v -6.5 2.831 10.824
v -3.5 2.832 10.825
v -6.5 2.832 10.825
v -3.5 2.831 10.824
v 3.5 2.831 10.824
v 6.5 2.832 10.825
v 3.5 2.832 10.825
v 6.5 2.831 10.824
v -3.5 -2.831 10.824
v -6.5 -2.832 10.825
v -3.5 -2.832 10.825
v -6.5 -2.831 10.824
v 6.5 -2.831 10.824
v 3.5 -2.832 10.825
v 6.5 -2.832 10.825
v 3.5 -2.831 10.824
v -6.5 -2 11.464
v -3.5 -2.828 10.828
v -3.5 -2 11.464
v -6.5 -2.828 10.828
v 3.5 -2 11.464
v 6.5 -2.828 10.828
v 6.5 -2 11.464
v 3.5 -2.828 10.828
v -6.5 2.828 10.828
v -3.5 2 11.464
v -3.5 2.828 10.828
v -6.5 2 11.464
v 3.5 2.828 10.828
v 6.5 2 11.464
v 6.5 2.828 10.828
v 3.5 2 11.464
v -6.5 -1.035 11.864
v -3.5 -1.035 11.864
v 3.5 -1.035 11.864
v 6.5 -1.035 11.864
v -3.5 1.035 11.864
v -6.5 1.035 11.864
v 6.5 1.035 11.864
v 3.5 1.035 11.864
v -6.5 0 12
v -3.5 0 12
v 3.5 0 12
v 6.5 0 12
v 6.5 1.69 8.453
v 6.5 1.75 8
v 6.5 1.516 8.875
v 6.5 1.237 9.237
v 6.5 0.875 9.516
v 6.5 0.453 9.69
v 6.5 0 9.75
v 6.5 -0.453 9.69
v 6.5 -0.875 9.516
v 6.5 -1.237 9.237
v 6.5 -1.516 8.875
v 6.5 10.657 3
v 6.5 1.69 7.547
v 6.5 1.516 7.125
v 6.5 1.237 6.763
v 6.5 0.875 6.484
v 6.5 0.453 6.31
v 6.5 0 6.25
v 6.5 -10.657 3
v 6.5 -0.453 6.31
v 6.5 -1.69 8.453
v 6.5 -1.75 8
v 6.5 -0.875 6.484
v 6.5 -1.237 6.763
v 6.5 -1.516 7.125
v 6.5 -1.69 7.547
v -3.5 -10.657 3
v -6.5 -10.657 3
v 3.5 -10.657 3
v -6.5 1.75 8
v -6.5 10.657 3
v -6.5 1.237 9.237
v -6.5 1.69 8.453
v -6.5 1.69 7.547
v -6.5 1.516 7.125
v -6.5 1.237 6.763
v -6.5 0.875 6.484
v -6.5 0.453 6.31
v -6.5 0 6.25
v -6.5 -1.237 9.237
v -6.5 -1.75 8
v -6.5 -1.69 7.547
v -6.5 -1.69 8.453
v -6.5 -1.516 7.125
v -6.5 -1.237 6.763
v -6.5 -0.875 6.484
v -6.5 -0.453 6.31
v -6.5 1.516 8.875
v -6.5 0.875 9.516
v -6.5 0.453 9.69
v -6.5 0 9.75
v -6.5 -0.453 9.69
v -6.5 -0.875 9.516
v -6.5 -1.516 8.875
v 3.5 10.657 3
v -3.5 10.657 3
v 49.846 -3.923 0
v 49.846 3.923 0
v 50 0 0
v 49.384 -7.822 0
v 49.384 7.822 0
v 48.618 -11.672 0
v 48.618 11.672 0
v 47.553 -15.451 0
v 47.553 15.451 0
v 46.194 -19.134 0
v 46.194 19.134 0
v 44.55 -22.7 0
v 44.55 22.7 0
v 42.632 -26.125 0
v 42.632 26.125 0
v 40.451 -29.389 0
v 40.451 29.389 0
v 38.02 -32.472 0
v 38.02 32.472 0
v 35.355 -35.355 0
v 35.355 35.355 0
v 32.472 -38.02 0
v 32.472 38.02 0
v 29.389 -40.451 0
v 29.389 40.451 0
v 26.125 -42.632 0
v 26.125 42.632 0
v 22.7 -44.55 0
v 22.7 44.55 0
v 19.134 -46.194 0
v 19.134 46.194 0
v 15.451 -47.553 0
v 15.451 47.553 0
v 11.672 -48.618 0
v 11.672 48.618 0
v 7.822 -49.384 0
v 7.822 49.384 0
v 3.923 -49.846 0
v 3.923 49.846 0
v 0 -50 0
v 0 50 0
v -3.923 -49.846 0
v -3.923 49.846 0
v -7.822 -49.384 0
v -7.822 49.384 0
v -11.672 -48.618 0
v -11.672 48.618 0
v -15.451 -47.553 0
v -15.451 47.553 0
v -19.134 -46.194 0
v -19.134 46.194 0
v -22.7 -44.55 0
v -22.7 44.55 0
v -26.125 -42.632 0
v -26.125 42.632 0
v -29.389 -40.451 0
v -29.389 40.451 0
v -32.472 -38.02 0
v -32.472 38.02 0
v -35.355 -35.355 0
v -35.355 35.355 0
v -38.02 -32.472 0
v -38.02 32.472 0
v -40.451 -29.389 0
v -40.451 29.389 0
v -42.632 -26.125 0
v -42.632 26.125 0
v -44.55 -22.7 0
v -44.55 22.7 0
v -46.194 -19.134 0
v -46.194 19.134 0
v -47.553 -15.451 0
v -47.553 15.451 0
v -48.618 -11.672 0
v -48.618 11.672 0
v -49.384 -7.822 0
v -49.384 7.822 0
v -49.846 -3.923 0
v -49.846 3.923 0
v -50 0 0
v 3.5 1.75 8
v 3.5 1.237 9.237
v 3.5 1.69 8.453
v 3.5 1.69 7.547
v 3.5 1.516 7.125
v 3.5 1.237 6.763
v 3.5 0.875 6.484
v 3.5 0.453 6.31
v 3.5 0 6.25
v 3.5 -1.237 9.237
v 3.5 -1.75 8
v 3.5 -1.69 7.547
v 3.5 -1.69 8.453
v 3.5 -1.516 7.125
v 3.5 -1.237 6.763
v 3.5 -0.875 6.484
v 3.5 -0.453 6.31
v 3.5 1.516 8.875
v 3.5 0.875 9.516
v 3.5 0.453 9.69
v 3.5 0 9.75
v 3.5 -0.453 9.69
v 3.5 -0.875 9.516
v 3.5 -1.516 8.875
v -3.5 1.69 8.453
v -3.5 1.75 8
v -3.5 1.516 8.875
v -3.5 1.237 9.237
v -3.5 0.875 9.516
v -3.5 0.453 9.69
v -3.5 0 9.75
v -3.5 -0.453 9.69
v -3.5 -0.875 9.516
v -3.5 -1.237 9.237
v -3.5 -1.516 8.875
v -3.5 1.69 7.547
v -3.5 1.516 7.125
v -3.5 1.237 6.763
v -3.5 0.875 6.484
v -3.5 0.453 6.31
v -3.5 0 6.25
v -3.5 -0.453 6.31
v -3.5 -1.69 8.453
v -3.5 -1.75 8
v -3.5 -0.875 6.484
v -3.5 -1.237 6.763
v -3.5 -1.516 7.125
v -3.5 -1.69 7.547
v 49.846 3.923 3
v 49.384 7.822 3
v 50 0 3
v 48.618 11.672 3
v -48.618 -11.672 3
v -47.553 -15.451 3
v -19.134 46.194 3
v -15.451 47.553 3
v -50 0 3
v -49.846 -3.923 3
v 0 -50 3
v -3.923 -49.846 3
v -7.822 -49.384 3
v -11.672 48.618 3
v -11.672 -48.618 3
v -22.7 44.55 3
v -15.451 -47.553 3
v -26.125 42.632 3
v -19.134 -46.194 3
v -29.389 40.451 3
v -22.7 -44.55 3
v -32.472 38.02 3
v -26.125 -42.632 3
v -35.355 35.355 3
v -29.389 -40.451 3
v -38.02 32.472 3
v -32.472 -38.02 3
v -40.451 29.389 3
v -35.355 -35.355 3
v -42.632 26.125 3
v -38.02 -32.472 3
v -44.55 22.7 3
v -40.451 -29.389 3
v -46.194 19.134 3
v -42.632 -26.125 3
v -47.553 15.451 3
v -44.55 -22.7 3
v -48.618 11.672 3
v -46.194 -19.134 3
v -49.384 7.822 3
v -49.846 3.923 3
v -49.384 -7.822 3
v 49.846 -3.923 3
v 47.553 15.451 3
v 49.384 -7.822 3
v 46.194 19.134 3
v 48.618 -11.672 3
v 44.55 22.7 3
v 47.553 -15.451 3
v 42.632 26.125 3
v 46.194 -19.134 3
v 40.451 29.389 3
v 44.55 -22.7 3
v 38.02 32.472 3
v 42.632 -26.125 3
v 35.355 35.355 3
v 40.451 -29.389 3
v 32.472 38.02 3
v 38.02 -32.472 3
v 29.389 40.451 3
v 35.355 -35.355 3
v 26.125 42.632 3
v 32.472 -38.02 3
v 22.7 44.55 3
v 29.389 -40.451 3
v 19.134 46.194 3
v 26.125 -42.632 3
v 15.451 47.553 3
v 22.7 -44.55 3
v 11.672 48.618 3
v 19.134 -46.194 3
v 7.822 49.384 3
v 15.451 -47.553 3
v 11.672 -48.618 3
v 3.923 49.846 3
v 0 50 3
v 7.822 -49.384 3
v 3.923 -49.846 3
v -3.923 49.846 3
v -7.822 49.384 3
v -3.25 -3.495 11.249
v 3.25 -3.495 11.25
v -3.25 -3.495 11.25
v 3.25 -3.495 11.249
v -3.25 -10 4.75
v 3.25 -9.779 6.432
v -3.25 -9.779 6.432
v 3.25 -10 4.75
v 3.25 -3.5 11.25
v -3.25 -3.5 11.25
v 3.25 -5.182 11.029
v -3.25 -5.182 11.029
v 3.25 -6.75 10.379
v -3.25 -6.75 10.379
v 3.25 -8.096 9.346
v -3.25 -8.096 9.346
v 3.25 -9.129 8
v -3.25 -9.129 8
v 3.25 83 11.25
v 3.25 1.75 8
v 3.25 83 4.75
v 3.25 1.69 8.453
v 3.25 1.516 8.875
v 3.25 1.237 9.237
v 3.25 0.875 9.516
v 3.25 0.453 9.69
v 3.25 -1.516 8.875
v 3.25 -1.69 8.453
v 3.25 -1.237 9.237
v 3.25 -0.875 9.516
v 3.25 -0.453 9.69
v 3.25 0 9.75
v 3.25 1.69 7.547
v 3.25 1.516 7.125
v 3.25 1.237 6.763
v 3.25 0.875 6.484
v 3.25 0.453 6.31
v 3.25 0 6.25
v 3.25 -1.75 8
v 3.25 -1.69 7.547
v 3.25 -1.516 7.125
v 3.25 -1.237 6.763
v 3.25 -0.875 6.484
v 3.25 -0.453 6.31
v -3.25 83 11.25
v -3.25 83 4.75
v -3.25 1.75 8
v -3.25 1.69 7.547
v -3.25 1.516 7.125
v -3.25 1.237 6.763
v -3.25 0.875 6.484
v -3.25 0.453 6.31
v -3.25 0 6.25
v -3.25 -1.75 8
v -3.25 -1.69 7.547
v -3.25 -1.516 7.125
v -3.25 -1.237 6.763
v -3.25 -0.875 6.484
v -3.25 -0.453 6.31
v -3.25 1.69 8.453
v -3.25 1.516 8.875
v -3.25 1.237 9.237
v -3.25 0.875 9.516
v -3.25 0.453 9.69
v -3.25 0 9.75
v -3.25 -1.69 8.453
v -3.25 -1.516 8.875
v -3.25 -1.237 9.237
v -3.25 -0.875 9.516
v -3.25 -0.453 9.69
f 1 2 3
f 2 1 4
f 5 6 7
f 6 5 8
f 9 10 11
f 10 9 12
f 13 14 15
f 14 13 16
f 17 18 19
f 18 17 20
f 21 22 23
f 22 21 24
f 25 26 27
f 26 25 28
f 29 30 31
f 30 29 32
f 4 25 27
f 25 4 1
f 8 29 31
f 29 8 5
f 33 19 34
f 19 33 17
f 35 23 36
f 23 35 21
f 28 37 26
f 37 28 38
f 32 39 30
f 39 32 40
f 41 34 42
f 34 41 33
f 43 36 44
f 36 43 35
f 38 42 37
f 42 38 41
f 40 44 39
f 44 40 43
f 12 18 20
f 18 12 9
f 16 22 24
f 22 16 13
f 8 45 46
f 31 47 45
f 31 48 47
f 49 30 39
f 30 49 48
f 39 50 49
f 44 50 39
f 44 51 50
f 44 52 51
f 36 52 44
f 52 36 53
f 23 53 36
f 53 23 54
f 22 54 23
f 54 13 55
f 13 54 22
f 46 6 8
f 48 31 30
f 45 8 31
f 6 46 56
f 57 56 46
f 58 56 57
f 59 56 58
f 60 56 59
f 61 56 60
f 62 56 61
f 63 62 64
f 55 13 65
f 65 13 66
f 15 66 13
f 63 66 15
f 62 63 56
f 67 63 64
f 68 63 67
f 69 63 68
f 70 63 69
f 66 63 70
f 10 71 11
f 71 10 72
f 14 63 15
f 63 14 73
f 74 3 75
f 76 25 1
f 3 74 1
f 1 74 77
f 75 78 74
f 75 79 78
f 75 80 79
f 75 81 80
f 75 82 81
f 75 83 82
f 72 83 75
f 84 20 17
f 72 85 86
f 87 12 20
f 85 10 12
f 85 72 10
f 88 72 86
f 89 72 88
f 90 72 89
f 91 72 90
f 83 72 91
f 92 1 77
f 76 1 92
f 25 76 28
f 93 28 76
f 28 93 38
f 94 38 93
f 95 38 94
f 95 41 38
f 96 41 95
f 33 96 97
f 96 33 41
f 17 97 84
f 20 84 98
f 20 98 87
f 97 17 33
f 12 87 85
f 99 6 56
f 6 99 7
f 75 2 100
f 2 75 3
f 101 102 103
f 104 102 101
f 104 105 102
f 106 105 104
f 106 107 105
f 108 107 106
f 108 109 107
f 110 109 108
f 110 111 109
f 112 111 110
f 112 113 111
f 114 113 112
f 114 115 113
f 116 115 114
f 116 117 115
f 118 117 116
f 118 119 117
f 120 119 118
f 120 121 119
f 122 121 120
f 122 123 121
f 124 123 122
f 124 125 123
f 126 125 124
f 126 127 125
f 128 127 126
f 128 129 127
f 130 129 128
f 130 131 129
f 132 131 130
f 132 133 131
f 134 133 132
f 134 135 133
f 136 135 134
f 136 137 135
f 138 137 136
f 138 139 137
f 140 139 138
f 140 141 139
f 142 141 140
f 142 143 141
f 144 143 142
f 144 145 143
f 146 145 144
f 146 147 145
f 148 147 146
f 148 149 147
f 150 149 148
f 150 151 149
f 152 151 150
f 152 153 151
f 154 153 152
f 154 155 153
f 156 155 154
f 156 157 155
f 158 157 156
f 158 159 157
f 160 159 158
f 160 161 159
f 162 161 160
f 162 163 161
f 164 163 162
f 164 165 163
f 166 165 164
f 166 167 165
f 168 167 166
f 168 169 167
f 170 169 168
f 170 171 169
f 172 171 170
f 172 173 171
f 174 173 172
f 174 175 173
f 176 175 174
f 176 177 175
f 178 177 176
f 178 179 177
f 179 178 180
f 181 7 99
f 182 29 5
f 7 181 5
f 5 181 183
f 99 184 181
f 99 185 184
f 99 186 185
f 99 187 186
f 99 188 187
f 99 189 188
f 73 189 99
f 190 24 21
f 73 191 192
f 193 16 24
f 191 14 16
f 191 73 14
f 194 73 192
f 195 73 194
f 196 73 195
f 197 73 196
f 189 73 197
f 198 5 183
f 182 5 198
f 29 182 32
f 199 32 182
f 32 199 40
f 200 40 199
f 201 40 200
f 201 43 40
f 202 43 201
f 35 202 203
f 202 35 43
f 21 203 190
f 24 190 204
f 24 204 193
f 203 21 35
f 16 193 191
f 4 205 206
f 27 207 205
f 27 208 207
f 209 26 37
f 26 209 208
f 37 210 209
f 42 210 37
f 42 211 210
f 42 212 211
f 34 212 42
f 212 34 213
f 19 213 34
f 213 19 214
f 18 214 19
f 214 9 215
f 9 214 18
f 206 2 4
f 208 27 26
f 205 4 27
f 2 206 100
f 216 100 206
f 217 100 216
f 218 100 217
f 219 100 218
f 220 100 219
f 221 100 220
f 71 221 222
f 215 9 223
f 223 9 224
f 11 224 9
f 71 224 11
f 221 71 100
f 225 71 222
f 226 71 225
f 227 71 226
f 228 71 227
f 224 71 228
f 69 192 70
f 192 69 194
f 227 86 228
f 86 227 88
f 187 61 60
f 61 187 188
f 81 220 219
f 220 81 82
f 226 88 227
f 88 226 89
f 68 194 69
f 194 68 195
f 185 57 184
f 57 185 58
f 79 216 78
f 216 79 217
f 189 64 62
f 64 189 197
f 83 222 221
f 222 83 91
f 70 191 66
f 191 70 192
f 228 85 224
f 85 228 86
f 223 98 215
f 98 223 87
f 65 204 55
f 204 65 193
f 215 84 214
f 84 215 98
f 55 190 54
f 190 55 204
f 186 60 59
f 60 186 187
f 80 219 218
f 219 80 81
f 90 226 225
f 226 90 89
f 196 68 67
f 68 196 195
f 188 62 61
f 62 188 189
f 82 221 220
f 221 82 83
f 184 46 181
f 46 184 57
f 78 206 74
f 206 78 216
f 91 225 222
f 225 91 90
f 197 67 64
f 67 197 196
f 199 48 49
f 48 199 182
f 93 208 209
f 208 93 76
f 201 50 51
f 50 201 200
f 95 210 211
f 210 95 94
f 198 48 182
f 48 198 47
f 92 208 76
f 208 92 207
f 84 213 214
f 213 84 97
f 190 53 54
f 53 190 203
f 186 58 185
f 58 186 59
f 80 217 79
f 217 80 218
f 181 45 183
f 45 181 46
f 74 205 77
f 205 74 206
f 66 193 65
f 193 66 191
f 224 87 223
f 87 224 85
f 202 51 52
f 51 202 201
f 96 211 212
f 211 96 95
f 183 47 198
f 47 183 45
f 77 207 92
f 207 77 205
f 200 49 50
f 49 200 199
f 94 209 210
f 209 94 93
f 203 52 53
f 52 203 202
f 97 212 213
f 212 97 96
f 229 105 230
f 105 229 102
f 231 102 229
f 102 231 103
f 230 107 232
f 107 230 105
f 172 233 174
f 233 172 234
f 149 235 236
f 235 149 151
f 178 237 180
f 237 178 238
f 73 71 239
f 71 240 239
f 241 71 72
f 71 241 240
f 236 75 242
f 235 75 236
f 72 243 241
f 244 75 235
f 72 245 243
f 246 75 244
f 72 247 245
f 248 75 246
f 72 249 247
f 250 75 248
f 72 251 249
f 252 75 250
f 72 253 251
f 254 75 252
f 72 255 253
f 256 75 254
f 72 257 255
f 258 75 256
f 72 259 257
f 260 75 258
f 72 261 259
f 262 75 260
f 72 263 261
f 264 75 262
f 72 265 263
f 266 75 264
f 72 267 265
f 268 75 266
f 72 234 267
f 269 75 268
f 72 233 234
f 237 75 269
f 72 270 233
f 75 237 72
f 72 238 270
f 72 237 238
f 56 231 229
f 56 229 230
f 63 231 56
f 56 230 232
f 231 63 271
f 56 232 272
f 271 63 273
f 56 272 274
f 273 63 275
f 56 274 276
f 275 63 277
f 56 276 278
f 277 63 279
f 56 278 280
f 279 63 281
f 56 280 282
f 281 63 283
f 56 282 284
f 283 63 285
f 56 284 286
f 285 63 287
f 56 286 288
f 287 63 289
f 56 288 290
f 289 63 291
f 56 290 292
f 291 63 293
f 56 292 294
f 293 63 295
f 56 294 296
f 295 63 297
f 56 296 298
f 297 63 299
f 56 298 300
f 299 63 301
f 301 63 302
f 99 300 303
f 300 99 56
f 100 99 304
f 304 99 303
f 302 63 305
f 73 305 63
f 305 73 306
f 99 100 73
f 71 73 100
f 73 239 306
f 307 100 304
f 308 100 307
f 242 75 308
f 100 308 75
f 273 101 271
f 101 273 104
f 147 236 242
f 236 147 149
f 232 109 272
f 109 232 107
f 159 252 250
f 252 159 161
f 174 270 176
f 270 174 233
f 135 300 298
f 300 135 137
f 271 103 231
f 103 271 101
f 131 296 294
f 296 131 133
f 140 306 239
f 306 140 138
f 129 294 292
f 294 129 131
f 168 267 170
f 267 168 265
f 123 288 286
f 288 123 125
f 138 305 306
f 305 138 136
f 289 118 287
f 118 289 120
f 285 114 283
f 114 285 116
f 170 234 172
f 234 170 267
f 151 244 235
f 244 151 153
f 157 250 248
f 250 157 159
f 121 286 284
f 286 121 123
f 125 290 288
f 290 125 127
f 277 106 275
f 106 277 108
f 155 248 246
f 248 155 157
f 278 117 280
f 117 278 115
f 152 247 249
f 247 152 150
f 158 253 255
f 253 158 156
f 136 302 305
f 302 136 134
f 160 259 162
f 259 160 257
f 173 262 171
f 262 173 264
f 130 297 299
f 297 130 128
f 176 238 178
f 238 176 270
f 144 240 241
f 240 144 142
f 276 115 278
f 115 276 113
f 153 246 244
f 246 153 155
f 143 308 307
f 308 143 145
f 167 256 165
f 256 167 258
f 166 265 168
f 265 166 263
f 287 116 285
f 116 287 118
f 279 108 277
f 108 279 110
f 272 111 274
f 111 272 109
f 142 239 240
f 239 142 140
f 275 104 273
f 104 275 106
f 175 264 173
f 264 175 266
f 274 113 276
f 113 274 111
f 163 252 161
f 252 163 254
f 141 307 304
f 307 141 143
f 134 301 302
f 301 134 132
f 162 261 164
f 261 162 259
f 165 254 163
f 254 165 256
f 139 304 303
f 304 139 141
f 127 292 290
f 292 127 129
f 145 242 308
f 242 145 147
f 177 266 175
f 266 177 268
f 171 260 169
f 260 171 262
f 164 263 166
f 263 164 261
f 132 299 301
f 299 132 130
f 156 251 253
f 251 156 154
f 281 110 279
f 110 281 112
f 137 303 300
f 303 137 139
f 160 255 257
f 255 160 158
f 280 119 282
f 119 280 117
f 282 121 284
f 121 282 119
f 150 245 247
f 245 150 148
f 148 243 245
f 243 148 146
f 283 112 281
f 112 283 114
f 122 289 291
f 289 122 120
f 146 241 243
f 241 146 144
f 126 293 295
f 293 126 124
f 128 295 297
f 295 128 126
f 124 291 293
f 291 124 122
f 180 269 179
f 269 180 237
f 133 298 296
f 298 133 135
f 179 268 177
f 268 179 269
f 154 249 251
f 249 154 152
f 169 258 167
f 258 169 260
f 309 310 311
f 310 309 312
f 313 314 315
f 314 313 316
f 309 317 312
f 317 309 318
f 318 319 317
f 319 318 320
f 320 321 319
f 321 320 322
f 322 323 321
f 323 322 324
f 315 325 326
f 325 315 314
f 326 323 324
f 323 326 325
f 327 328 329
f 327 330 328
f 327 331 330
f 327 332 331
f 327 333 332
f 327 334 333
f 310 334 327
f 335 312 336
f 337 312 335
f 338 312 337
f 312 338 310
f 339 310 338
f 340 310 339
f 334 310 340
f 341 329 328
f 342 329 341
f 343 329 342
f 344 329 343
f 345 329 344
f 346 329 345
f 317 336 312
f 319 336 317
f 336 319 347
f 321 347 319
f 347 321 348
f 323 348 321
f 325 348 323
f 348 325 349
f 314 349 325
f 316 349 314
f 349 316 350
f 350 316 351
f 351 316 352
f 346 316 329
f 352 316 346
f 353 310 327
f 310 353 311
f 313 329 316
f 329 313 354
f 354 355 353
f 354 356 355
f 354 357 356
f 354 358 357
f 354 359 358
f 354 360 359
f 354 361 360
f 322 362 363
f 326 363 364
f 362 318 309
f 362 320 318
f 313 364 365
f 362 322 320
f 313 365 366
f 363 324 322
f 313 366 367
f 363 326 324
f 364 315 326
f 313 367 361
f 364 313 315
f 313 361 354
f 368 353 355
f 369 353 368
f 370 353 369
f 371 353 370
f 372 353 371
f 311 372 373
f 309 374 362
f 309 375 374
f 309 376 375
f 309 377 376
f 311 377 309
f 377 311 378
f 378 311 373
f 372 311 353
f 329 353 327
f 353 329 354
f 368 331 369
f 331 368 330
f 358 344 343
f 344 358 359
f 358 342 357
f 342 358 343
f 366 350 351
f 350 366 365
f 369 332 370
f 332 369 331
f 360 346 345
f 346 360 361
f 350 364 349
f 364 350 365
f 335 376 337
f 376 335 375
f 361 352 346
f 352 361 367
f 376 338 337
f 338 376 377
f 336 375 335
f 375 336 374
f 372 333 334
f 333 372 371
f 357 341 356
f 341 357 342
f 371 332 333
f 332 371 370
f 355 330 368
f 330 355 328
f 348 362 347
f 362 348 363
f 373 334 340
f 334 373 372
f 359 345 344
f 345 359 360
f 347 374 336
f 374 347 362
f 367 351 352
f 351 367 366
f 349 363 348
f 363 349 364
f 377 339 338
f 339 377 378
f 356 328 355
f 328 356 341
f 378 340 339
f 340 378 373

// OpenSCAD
diameter = 100;
thickness = 3;
holeDiam = 3.5;
holeHeight = 5;

cornerRadius = 4;
rodWidth = 6.5;
rodLength = 93;
rodHolePos = 10;

$fn = 24;

module fillet(r, h) {
    translate([r / 2, r / 2, 0])
    difference() {
        cube([r + 0.01, r + 0.01, h], center = true);
        translate([r/2, r/2, 0]) cylinder(r = r, h = h + 1, center = true);
    }
}

module roundCornerCube(size, r) {
    difference() {
        cube(size, center=true);
        translate([0, size[1]/2, size[2]/2]) rotate([0, 90, 180])
            fillet(cornerRadius, size[0]+0.01);
    }
}

module cap() {
    cubeSide = 2*cornerRadius + sqrt(2)*holeHeight;
    sep = 2*thickness + rodWidth + 0.5;

    union() {
        cylinder(thickness, d=diameter, $fn=80);
        difference() {
            intersection() {
                translate([0, 0, thickness]) rotate([45, 0, 0])
                    roundCornerCube([sep, cubeSide, cubeSide], cornerRadius);
                cylinder(cubeSide, d=diameter);
            }
            cube([rodWidth + 0.5, 2*cubeSide, 2*cubeSide], center=true);
            translate([0, 0, thickness+holeHeight])
                rotate([0, 90, 0]) cylinder(sep, d=holeDiam, center=true);
        }
    }
}

module rod() {
    difference() {
        cube([rodWidth, rodLength, rodWidth], center=true);
        translate([0, -rodLength/2 + rodHolePos, 0]) rotate([0, 90, 0])
            cylinder(rodWidth+0.01, d=holeDiam, center=true);
        translate([0, -rodLength/2, rodWidth/2]) rotate([0, 90, 0])
            fillet(rodWidth, rodWidth+0.01);
    }
}

part = 0;

if (part == 1) {
    cap();
} else if (part == 2) {
    rod();
} else {
    // assembly
    cap();
    translate([0, rodLength/2 - rodHolePos, thickness + holeHeight]) rod();
}
